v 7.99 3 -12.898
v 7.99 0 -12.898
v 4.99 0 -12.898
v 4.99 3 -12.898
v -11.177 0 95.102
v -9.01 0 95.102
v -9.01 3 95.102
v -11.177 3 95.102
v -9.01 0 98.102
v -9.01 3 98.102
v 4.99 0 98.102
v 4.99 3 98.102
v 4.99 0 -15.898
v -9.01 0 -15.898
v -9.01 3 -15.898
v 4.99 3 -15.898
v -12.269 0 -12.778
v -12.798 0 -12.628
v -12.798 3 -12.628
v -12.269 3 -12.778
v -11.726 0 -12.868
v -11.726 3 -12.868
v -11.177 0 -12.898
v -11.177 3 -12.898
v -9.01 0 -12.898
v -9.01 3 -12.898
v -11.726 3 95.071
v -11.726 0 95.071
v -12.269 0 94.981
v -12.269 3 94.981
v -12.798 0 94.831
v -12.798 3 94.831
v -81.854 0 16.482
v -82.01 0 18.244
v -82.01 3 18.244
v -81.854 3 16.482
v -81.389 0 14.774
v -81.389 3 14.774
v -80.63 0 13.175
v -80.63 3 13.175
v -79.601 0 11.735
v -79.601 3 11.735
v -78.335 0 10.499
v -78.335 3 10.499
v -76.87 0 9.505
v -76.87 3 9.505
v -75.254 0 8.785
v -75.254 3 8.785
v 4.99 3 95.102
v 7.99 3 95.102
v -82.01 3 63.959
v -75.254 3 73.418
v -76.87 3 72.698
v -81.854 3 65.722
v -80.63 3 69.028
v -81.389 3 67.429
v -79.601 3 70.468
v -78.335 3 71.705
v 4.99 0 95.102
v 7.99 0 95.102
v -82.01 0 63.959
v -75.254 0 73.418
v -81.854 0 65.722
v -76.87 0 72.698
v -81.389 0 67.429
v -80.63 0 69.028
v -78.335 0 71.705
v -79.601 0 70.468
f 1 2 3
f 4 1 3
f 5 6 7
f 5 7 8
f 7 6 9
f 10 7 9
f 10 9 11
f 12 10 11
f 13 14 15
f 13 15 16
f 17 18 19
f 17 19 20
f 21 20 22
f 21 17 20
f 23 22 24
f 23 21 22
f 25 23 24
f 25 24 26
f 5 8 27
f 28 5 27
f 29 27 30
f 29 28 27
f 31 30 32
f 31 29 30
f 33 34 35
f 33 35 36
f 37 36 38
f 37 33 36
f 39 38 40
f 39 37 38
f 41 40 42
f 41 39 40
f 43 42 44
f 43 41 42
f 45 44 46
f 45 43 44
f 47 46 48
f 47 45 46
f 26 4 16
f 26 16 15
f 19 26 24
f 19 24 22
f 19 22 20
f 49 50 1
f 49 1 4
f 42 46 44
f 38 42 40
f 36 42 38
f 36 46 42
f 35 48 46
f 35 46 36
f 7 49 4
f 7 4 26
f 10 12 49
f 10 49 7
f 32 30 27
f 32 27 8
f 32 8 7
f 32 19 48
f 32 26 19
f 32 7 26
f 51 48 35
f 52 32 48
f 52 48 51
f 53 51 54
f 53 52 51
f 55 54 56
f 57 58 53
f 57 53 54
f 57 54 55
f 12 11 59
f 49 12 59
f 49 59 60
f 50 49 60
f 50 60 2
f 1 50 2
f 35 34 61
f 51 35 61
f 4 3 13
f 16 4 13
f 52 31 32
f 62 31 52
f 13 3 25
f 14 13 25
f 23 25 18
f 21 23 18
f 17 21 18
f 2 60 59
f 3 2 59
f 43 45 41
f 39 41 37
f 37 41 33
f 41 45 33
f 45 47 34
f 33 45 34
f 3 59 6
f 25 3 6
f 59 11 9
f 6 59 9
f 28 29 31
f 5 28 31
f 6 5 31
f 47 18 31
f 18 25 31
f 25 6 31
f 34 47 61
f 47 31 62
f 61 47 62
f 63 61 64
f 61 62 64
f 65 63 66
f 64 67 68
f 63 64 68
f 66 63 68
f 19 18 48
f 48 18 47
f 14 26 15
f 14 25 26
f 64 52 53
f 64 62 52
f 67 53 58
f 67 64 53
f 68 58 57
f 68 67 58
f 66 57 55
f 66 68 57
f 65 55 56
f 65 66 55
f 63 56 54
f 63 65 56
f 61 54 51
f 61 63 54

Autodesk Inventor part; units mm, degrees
ref_plane "YZ Plane" through (0, 0, 0) normal (1, 0, 0) x (0, 1, 0)
ref_plane "XZ Plane" through (0, 0, 0) normal (0, 1, 0) x (-1, 0, 0)
ref_plane "XY Plane" through (0, 0, 0) normal (0, 0, 1) x (1, 0, 0)
sketch "Sketch1" plane through (0, 0, 0) normal (0, 1, 0) x (-1, 0, 0)
  line L0 (9.0102, -12.8984) -> (9.0102, -15.8984)
  line L1 (9.0102, 95.1016) -> (9.0102, 98.1016)
  line L2 (9.0102, -15.8984) -> (-4.9898, -15.8984)
  line L3 (9.0102, 98.1016) -> (-4.9898, 98.1016)
  line L4 (-4.9898, 98.1016) -> (-4.9898, 95.1016)
  line L5 (-4.9898, 95.1016) -> (-7.9898, 95.1016)
  line L6 (-7.9898, 95.1016) -> (-7.9898, -12.8984)
  line L7 (-7.9898, -12.8984) -> (-4.9898, -12.8984)
  line L8 (-4.9898, -12.8984) -> (-4.9898, -15.8984)
  line L9 (9.0102, 95.1016) -> (11.1769, 95.1016)
  line L10 (11.1769, -12.8984) -> (9.0102, -12.8984)
  line L11 (82.0102, 18.2445) -> (82.0102, 63.9587)
  arc A0 (75.2535, 8.785) -> (82.0102, 18.2445) centre (72.0102, 18.2445) ccw
  arc A1 (82.0102, 63.9587) -> (75.2535, 73.4182) centre (72.0102, 63.9587) ccw
  line L12 (12.7985, -12.6281) -> (75.2535, 8.785)
  arc A2 (11.1769, -12.8984) -> (12.7985, -12.6281) centre (11.1769, -7.8984) ccw
  line L13 (12.7985, 94.8313) -> (75.2535, 73.4182)
  arc A3 (12.7985, 94.8313) -> (11.1769, 95.1016) centre (11.1769, 90.1016) ccw
  point P0 (0, 0)
extrude "Extrusion1" add sketch "Sketch1" along normal blind 3
properties part number "rearCover" material "Polycarbonate, Clear"
